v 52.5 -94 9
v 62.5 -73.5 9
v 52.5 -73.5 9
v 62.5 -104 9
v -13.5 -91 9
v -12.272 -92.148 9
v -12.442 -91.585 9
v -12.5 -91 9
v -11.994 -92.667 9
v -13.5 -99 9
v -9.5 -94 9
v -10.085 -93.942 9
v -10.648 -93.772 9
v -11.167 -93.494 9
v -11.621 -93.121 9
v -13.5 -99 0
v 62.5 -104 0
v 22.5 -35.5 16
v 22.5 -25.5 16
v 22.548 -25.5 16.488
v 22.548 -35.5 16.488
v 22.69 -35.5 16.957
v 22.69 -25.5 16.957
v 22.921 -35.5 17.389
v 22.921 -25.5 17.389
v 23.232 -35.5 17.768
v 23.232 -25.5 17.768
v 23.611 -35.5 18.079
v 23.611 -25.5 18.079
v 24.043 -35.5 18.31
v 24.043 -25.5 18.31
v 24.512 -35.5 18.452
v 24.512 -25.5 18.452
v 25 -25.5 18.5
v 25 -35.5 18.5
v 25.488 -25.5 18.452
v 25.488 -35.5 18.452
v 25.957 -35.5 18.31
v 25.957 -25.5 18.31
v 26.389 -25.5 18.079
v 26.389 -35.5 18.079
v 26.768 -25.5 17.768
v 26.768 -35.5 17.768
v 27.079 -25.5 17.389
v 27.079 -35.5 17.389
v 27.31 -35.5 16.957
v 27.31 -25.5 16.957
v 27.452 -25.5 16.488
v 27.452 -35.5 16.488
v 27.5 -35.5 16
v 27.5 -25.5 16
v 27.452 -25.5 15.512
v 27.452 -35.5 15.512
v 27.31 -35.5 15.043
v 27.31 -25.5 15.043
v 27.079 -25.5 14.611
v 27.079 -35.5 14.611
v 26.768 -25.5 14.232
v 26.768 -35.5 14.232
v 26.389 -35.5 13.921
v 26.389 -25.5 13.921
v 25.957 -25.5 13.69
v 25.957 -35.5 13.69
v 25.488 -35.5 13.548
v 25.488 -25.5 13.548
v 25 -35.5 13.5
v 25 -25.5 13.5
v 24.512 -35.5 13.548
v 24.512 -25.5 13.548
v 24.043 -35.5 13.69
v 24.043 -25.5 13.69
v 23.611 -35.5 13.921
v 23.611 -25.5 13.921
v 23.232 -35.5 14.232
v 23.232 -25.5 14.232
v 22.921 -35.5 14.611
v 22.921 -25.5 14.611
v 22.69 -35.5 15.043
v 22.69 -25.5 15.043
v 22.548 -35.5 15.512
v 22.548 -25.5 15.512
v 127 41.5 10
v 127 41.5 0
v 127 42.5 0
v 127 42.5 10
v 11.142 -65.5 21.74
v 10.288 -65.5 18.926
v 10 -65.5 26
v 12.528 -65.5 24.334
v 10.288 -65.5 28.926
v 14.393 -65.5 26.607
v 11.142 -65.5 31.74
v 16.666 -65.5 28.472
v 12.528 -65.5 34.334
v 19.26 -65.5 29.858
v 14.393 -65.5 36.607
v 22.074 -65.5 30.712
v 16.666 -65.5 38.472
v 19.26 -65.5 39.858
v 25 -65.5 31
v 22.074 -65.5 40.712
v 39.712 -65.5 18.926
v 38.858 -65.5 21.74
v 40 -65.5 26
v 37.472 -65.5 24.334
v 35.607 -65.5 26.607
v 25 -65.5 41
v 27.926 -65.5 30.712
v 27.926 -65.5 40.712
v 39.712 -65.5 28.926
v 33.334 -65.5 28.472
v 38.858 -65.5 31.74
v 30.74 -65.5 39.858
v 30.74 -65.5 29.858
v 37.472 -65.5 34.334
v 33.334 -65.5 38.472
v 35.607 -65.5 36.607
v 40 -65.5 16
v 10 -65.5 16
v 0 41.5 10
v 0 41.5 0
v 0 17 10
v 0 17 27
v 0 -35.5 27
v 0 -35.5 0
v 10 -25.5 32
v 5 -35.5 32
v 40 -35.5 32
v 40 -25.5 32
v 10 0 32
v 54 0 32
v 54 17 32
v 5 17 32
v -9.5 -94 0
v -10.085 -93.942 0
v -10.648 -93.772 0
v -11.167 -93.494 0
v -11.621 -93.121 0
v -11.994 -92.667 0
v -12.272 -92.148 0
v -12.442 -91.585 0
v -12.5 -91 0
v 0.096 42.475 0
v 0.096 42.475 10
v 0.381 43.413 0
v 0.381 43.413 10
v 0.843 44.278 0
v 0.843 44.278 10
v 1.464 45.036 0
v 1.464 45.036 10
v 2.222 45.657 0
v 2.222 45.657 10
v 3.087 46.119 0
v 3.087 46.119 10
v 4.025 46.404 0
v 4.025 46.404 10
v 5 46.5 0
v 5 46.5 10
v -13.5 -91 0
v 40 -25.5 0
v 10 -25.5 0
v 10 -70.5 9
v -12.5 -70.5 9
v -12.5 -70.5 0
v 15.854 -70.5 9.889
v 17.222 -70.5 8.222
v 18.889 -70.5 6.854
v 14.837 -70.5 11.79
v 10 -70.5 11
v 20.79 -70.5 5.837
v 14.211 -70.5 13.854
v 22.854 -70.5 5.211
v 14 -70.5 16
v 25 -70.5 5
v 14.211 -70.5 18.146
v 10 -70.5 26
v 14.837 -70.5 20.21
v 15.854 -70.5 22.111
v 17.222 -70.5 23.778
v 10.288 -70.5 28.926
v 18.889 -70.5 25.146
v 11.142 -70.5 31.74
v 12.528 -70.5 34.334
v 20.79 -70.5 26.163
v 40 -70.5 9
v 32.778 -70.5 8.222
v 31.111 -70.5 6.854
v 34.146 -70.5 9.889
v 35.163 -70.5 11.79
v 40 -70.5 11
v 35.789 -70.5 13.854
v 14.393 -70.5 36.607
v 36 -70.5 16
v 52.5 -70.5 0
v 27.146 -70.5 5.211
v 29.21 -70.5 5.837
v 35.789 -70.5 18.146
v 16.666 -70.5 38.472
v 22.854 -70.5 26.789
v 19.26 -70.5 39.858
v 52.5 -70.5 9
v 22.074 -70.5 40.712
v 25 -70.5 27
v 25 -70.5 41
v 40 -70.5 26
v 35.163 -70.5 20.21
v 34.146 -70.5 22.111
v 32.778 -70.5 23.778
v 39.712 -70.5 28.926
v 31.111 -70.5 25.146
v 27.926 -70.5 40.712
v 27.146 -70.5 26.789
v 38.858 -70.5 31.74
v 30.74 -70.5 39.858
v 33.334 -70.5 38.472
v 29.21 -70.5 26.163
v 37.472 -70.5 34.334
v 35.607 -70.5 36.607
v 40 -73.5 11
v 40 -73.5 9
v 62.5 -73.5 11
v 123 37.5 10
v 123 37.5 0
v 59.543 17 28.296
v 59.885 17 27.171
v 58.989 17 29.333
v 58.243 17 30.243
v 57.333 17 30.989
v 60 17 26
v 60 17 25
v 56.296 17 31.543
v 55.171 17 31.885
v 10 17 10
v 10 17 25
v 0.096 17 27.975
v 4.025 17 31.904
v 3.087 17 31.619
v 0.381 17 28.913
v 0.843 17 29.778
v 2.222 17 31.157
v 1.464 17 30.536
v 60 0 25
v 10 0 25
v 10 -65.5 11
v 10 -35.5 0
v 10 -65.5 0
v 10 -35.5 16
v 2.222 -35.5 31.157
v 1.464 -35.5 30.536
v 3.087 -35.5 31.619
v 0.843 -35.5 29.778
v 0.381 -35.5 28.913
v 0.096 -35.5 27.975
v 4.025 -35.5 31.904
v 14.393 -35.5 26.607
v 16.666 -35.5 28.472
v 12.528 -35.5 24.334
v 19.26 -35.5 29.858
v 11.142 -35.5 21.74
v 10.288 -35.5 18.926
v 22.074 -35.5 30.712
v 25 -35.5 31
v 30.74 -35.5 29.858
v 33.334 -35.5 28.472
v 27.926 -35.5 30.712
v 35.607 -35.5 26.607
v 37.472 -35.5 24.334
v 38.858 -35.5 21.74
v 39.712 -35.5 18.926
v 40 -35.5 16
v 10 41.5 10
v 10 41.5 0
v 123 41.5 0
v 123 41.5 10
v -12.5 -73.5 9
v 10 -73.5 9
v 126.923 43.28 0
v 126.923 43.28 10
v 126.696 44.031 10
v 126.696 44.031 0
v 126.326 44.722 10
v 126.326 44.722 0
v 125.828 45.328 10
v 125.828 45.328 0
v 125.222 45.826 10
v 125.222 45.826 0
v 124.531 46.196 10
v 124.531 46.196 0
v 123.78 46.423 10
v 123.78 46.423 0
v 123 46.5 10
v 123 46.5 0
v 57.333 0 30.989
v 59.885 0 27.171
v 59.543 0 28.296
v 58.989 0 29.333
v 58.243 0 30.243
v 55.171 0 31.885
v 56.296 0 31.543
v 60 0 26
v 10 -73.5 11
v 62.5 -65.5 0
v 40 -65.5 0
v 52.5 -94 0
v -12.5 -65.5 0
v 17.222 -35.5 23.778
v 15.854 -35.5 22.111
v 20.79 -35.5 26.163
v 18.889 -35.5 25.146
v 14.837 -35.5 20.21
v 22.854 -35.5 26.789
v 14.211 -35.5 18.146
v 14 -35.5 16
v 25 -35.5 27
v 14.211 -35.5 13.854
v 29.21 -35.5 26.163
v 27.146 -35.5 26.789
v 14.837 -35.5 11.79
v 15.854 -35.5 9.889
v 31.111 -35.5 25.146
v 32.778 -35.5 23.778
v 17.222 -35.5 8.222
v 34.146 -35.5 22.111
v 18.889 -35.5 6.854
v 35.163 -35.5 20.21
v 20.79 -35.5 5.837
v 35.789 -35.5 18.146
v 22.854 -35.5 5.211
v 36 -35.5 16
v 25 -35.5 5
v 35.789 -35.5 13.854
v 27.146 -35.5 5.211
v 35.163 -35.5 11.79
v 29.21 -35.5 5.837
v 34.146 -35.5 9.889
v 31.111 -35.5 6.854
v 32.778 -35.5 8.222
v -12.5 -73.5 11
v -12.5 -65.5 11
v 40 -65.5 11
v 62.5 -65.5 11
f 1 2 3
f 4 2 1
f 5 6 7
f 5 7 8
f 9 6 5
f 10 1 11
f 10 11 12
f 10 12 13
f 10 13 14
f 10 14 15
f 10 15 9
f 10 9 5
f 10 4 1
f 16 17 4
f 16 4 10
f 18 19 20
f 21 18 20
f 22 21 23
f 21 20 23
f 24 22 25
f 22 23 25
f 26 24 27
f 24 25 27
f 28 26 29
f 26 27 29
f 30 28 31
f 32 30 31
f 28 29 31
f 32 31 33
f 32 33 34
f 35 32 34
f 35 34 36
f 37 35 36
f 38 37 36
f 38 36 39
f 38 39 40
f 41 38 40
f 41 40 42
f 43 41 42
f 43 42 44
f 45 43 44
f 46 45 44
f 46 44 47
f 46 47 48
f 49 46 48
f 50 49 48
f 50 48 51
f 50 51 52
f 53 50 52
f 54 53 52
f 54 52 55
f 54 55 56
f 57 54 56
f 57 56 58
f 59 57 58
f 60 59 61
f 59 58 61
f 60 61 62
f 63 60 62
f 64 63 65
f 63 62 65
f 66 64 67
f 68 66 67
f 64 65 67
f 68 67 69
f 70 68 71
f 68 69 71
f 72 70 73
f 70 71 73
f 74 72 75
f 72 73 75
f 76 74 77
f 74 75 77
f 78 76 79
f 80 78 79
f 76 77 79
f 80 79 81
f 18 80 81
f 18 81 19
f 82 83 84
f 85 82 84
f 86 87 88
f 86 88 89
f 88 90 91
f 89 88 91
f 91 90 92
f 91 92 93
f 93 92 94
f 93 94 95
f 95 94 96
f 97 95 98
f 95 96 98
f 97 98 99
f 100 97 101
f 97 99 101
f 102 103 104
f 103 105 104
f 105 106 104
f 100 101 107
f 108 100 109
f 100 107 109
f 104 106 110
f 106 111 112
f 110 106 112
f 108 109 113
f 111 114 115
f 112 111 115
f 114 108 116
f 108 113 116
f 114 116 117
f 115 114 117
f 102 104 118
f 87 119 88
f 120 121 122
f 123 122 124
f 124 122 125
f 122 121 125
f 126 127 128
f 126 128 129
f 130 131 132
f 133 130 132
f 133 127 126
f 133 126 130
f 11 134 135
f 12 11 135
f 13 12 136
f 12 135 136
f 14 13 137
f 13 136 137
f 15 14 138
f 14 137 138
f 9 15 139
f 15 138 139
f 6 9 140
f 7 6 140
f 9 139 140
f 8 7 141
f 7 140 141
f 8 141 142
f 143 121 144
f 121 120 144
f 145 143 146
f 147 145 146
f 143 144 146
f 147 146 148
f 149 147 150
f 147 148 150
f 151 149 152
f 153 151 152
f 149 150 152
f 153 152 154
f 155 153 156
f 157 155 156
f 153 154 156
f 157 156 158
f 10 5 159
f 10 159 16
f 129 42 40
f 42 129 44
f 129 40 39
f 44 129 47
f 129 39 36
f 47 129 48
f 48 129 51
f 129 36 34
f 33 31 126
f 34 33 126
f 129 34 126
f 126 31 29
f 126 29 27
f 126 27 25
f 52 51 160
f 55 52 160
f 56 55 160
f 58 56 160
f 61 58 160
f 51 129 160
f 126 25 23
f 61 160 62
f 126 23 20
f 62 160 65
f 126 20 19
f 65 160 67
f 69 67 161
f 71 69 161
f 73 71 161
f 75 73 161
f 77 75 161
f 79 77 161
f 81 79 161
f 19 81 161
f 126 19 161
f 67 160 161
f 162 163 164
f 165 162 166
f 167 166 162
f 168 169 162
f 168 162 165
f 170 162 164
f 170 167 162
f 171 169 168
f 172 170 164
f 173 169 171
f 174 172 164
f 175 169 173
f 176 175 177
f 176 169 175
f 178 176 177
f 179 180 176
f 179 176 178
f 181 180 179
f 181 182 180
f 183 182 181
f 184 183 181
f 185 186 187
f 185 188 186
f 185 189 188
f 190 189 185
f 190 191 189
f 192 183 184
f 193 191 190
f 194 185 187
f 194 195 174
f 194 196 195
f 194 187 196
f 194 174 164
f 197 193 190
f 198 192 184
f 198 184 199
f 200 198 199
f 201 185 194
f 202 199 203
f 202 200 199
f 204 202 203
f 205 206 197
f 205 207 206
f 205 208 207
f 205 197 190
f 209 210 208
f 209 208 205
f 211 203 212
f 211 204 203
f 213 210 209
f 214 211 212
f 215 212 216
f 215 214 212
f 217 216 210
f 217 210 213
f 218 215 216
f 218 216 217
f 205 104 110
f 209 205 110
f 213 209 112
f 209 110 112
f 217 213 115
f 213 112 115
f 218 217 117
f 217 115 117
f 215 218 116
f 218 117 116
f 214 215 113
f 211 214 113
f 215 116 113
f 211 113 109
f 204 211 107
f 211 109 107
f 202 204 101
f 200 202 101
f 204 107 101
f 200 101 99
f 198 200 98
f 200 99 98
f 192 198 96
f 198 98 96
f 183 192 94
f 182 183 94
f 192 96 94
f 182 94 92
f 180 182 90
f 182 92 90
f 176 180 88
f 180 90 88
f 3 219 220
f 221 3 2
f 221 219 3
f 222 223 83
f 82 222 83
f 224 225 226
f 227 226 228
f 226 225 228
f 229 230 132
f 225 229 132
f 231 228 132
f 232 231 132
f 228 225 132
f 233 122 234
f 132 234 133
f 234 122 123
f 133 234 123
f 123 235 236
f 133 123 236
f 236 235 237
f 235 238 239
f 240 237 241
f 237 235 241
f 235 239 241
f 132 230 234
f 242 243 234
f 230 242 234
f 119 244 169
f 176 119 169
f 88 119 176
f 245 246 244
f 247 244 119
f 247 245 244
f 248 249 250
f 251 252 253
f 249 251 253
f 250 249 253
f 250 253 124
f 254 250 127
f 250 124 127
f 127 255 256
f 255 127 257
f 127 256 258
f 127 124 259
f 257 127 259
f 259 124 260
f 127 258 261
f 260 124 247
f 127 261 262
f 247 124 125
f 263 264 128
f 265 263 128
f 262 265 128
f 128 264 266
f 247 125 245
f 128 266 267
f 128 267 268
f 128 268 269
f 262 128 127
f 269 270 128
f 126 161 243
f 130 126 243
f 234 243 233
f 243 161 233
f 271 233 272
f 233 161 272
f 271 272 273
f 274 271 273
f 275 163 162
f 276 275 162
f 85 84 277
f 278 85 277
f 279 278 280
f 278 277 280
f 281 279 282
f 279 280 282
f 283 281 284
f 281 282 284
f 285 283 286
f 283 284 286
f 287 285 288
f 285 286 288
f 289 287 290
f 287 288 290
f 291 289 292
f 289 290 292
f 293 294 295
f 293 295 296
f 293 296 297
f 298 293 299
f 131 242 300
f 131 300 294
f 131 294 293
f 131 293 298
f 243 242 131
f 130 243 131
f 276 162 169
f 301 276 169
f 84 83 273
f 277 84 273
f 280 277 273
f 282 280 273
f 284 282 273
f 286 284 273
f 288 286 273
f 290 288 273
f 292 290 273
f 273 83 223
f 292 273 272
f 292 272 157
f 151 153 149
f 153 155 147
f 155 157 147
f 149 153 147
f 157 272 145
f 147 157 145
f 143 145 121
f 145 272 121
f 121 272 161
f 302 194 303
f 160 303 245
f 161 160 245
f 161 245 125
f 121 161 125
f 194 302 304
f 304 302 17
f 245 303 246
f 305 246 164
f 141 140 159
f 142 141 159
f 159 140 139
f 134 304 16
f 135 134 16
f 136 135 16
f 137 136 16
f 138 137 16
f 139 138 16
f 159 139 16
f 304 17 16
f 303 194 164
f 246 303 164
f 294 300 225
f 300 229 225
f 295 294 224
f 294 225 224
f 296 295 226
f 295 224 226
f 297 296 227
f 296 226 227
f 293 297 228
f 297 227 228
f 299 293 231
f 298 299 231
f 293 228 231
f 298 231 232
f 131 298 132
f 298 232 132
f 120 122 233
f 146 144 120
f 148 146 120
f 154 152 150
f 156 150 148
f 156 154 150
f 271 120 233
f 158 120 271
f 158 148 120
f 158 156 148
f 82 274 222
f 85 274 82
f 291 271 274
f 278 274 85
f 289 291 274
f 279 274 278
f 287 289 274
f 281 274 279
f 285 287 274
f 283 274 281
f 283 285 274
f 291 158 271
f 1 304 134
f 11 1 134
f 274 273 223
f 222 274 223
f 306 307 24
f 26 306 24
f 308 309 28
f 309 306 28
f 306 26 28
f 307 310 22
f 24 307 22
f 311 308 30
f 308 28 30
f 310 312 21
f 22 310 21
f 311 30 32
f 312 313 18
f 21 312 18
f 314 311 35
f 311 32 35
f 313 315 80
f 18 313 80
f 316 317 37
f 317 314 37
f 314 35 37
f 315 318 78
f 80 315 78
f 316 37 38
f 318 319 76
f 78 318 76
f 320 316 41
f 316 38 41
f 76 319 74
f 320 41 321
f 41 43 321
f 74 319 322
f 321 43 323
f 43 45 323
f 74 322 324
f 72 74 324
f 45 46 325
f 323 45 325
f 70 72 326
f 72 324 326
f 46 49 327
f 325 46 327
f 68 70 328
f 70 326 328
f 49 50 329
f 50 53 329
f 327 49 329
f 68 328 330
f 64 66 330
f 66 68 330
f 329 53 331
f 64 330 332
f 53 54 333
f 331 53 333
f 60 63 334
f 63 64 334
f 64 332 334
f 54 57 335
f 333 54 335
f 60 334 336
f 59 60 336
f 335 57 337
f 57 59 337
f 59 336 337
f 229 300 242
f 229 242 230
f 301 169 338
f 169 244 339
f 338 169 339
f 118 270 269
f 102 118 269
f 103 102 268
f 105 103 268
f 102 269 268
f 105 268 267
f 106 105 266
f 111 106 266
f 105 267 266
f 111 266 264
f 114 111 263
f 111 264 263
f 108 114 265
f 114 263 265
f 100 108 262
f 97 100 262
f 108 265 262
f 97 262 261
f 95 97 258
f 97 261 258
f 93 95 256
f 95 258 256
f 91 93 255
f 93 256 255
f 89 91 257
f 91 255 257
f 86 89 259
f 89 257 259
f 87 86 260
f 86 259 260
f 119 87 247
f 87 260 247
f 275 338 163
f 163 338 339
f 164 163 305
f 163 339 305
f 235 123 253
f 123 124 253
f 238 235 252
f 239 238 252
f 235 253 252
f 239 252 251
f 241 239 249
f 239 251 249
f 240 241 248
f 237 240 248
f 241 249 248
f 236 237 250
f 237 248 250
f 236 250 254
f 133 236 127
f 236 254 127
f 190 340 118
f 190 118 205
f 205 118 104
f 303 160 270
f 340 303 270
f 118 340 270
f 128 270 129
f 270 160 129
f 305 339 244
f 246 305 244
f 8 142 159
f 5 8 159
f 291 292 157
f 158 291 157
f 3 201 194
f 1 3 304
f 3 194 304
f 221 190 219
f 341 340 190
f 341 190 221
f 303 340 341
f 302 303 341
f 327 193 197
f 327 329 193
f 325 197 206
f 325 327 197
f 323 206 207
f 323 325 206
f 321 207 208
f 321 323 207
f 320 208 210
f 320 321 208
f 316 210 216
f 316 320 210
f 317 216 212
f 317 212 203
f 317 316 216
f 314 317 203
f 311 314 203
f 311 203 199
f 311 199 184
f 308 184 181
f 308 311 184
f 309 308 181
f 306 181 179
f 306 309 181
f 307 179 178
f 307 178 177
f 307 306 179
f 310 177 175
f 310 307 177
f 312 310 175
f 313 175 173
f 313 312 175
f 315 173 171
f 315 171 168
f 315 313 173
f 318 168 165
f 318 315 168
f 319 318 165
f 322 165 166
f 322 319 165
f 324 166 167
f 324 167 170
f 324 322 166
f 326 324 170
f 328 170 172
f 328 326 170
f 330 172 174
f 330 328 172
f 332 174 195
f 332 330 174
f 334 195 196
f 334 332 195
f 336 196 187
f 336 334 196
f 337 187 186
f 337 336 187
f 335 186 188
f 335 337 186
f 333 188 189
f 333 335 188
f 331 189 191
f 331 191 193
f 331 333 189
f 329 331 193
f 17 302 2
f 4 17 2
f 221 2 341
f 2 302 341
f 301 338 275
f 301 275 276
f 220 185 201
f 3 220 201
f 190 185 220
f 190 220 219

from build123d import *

# Parameters (mm, degrees)
PAD_DEPTH    = 10
PAD001_DEPTH = 22
SKETCH003_W  = 17
SKETCH003_H  = 7
PAD002_DEPTH = 50
FILLET_R     = 6
FILLET001_R  = 5
FILLET002_R  = 5
SKETCH004_R  = 2.5
POCKET_DEPTH = 10.001
SKETCH005_R  = 11
PAD003_DEPTH = 30
SKETCH006_R  = 11
PAD004_DEPTH = 5
PAD005_DEPTH = 9
SKETCH008_W  = 22.5
SKETCH008_H  = 2
PAD006_DEPTH = 3


with BuildPart() as part:
    # Sketch → Pad (new body)
    with BuildSketch(Plane.XY):
        with BuildLine():
            Line((123, 46.5), (0, 46.5))
            Line((0, 46.5), (0, -35.5))
            Line((0, -35.5), (40, -35.5))
            Line((40, -35.5), (40, -25.5))
            Line((40, -25.5), (10, -25.5))
            Line((10, -25.5), (10, 41.5))
            Line((10, 41.5), (123, 41.5))
            Line((123, 41.5), (123, 37.5))
            Line((123, 37.5), (127, 41.5))
            Line((127, 41.5), (127, 42.5))
            ThreePointArc((127, 42.5), (125.828427, 45.328427), (123, 46.5))
        make_face()
    extrude(amount=PAD_DEPTH)

    # Sketch002 (on Face13 of Pad) → Pad001 (join)
    with BuildSketch(Plane.XY.offset(10)):
        Polygon((0, -35.5), (40, -35.5), (40, -25.5), (10, -25.5), (10, 17), (0, 17), align=None)
    extrude(amount=PAD001_DEPTH)

    # Sketch003 (on Face20 of Pad001) → Pad002 (join)
    with BuildSketch(Plane.YZ.offset(10)):
        with Locations((8.5, 28.5)):
            Rectangle(SKETCH003_W, SKETCH003_H)
    extrude(amount=PAD002_DEPTH)

    # Fillet
    fillet_edges = [part.edges().sort_by_distance(p)[0] for p in [
        (60, 8.5, 32),
    ]]
    fillet(fillet_edges, radius=FILLET_R)

    # Fillet001
    fillet001_edges = [part.edges().sort_by_distance(p)[0] for p in [
        (0, 46.5, 5),
    ]]
    fillet(fillet001_edges, radius=FILLET001_R)

    # Fillet002
    fillet002_edges = [part.edges().sort_by_distance(p)[0] for p in [
        (0, -9.25, 32),
    ]]
    fillet(fillet002_edges, radius=FILLET002_R)

    # Sketch004 (on Face19 of Fillet002) → Pocket (cut, through all)
    with BuildSketch(Plane(origin=(0, -25.5, 0), x_dir=(-1, 0, 0), z_dir=(0, 1, 0))):
        with Locations((-25, 16)):
            Circle(SKETCH004_R)
    extrude(amount=-POCKET_DEPTH, mode=Mode.SUBTRACT)

    # Sketch005 (on Face9 of Pocket) → Pad003 (join)
    with BuildSketch(Plane.XZ.offset(35.5)):
        with BuildLine():
            ThreePointArc((40, 16), (25, 31), (10, 16))
            Line((10, 16), (10, 0))
            Line((10, 0), (40, 0))
            Line((40, 0), (40, 16))
        make_face()
        with Locations((25, 16)):
            Circle(SKETCH005_R, mode=Mode.SUBTRACT)
    extrude(amount=PAD003_DEPTH)

    # Sketch006 (on Face34 of Pad003) → Pad004 (join)
    with BuildSketch(Plane.XZ.offset(65.5)):
        with BuildLine():
            ThreePointArc((40, 26), (25, 41), (10, 26))
            Line((10, 11), (10, 26))
            Line((10, 11), (-12.5, 11))
            Line((-12.5, 11), (-12.5, 0))
            Line((-12.5, 0), (62.5, 0))
            Line((62.5, 0), (62.5, 11))
            Line((62.5, 11), (40, 11))
            Line((40, 11), (40, 26))
        make_face()
        with Locations((25, 16)):
            Circle(SKETCH006_R, mode=Mode.SUBTRACT)
    extrude(amount=PAD004_DEPTH)

    # Sketch007 (on Face40 of Pad004) → Pad005 (join)
    with BuildSketch(Plane(origin=(0, 0, 0), x_dir=(1, 0, 0), z_dir=(0, 0, -1))):
        with BuildLine():
            Line((52.5, 70.5), (52.5, 94))
            Line((52.5, 94), (-9.5, 94))
            ThreePointArc((-9.5, 94), (-11.62132, 93.12132), (-12.5, 91))
            Line((-12.5, 91), (-13.5, 91))
            Line((-13.5, 91), (-13.5, 99))
            Line((62.5, 104), (-13.5, 99))
            Line((62.5, 104), (62.5, 94))
            Line((62.5, 94), (62.5, 70.5))
            Line((62.5, 70.5), (52.5, 70.5))
        make_face()
    extrude(amount=-PAD005_DEPTH)

    # Sketch008 (on Face43 of Pad005) → Pad006 (join)
    with BuildSketch(Plane.XZ.offset(70.5)):
        with Locations((51.25, 10)):
            Rectangle(SKETCH008_W, SKETCH008_H)
        with Locations((-1.25, 10)):
            Rectangle(SKETCH008_W, SKETCH008_H)
    extrude(amount=PAD006_DEPTH)


solid = part.part
